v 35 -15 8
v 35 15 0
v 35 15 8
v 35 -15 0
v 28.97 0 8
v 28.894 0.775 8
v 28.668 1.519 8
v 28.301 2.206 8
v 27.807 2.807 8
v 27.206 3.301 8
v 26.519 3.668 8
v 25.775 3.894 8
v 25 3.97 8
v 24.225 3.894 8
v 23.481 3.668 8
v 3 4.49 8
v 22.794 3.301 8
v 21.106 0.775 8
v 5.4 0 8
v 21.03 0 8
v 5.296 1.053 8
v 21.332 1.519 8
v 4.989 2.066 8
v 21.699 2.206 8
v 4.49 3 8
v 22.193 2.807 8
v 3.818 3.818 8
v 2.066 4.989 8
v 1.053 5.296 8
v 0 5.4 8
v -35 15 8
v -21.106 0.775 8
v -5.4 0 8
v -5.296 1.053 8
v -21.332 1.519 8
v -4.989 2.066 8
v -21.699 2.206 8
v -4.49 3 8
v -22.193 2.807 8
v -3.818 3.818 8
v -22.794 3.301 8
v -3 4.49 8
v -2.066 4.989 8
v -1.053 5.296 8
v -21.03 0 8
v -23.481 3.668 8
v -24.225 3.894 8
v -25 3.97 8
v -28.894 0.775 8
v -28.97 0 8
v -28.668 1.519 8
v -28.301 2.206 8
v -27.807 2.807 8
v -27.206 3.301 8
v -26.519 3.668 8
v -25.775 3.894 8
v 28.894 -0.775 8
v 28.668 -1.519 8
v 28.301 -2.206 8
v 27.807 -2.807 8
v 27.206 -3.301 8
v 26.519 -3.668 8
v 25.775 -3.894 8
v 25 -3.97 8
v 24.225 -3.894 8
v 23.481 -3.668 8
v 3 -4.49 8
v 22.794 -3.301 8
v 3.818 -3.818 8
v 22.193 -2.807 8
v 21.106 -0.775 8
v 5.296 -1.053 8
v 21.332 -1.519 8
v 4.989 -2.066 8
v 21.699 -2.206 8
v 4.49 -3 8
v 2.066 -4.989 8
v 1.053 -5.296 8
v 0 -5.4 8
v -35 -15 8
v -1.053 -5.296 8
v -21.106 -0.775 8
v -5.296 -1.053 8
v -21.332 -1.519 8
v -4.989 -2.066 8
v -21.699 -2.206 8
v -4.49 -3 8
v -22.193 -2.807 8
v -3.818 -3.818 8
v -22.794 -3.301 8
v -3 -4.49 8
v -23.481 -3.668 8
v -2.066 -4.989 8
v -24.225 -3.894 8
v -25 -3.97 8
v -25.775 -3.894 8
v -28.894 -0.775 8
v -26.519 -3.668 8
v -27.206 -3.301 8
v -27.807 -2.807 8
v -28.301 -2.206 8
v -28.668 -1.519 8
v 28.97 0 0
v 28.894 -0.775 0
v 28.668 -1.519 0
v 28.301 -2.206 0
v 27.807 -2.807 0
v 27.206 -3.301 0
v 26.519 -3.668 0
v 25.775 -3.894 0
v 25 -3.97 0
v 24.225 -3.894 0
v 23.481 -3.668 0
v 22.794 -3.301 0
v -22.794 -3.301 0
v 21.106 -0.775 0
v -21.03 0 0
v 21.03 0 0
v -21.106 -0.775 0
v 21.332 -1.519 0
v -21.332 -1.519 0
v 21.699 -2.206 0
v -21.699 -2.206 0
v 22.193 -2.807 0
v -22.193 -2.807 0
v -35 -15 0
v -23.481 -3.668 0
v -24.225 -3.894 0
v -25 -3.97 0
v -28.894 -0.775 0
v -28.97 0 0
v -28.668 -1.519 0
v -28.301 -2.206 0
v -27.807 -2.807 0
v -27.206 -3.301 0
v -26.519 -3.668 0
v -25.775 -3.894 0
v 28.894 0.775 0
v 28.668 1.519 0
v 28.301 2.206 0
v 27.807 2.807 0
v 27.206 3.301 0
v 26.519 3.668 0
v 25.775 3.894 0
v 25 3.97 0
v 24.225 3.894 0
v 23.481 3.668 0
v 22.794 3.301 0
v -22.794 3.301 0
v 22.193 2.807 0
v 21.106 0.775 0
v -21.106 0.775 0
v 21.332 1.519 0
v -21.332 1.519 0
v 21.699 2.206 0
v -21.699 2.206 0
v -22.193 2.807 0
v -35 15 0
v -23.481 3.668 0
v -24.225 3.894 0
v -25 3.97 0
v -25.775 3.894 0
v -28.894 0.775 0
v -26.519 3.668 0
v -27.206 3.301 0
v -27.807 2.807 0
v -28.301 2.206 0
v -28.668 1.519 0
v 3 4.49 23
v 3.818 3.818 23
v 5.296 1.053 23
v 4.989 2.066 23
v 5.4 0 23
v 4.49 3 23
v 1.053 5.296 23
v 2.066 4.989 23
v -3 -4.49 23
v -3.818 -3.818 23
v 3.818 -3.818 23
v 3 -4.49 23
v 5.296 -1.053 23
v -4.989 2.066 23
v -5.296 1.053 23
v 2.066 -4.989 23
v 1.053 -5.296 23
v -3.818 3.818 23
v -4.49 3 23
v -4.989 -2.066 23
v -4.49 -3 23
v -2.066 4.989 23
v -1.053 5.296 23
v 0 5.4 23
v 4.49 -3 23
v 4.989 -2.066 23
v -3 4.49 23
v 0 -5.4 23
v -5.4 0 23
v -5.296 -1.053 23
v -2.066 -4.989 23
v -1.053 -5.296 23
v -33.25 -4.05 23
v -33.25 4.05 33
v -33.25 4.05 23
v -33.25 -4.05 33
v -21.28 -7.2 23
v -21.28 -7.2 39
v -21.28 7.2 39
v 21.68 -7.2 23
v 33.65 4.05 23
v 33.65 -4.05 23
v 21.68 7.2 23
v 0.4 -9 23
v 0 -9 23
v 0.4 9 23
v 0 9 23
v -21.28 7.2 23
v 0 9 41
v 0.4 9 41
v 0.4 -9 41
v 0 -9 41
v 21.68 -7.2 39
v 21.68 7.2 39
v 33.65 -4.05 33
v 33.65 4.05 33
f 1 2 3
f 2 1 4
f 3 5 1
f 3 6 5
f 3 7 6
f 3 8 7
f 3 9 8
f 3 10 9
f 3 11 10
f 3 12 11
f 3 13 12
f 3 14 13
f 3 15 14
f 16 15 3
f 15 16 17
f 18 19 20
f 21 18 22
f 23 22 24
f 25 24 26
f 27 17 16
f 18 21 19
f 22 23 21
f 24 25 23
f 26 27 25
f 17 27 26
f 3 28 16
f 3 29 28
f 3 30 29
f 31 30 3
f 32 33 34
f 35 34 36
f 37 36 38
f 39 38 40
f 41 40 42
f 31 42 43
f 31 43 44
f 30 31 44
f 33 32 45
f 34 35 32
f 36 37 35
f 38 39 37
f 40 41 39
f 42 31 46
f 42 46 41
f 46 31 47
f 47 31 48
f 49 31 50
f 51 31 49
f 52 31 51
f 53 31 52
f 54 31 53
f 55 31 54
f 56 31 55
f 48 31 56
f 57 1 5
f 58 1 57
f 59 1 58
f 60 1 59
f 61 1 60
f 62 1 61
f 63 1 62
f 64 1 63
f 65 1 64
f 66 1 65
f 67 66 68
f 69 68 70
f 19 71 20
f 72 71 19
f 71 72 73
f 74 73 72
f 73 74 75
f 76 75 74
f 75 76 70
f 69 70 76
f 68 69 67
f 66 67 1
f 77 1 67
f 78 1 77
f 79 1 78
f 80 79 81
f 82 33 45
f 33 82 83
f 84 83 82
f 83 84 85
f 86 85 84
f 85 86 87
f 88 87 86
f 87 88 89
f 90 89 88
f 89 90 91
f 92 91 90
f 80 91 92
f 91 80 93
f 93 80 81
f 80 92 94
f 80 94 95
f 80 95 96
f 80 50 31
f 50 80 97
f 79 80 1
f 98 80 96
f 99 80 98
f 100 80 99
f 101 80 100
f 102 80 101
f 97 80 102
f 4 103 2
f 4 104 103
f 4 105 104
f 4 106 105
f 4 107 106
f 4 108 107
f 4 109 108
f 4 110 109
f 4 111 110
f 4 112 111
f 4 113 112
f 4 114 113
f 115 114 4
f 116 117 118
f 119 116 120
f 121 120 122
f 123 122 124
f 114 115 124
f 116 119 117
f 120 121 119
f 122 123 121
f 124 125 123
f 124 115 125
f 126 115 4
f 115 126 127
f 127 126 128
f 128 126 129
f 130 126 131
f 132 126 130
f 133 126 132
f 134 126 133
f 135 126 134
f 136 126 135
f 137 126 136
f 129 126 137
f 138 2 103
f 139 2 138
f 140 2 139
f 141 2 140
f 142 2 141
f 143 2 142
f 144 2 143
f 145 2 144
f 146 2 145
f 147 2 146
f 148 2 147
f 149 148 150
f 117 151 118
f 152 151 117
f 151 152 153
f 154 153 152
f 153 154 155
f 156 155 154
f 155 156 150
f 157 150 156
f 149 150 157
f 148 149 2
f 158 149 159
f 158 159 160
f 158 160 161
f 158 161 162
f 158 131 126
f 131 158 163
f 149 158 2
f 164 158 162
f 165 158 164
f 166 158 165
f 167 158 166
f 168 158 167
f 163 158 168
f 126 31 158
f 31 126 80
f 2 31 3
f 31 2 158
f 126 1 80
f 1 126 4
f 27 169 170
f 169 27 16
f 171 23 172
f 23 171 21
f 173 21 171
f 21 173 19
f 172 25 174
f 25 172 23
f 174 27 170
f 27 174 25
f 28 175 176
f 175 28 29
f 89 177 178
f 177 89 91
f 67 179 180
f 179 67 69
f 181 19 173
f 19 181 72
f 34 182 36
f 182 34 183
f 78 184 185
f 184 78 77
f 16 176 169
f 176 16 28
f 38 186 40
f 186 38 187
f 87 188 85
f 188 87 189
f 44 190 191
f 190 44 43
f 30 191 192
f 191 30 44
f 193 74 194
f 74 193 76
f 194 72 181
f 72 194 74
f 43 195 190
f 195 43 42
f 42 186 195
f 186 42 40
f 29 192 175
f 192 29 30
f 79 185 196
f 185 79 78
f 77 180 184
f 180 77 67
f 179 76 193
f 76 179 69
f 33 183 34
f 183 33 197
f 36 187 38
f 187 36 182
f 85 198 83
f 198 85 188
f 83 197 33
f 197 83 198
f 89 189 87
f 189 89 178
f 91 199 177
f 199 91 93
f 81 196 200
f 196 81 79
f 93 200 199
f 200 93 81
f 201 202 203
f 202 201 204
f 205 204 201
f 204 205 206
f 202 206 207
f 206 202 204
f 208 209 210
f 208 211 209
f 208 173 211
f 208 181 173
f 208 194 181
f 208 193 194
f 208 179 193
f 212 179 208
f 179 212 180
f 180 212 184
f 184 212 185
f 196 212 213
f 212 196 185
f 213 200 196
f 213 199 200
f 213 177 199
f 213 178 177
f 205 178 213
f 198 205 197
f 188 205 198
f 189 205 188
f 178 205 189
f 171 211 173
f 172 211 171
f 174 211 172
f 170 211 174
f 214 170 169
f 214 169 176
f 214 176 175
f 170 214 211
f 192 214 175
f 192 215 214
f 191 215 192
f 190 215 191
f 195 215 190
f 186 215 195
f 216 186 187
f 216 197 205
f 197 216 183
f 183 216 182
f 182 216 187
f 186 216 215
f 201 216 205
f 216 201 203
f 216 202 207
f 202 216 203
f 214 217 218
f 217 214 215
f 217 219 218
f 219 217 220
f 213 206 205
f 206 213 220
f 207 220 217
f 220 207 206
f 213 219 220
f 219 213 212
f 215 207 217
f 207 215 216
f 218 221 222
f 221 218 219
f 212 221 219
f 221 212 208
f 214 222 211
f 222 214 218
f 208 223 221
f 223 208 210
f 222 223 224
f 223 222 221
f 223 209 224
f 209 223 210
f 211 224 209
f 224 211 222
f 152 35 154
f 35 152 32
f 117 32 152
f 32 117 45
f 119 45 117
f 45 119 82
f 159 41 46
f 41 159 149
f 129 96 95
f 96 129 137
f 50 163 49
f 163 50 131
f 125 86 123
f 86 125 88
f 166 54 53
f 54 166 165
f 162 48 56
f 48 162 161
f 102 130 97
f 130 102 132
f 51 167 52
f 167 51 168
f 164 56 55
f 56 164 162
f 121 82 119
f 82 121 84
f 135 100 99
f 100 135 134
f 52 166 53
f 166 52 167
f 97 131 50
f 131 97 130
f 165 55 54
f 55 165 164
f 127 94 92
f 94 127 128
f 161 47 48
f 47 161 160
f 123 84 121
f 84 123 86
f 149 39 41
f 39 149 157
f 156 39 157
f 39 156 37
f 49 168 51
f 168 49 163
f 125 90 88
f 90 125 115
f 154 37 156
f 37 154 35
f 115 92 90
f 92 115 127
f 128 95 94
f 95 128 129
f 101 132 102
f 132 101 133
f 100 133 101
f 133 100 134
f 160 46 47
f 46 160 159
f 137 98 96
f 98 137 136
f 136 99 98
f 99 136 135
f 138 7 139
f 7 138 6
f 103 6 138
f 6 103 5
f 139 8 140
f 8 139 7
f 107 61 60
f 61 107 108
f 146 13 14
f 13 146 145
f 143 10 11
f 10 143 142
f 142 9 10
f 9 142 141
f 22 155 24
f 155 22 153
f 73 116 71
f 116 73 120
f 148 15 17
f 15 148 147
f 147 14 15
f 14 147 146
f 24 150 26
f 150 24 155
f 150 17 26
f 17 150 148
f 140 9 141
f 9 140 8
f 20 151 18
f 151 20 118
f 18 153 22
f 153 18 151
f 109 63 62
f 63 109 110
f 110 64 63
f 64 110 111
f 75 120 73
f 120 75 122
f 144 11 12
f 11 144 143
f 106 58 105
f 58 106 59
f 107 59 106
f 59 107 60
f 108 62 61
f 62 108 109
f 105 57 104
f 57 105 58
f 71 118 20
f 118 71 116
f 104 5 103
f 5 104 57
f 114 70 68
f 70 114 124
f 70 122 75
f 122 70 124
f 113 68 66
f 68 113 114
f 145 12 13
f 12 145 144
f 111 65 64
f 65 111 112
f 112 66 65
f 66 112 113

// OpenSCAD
$fn = 32;

// ----------------------------------------------------------------------
// Boat cleat: 70 mm base, horn 32 mm up
// ----------------------------------------------------------------------

// --- parameters (mm) ---
base_l = 70;              // base length
base_w = 30;              // base width
base_t = 8;               // base thickness
horn_len = 66.5;          // horn length
horn_d = 18;              // horn diameter at the middle
horn_z = 32;              // horn axis height
end_drop = 8;             // how far the horn tips drop
post_d = 10.8;            // centre post diameter
holes_d = 7.94;           // fixing holes
hole_x = 25;              // fixing hole spacing

difference() {
  union() {
    translate([-35, -15, 0]) cube([base_l, base_w, base_t]);
    /* centre post, sunk 1 mm into the base */
    translate([0, 0, 7]) cylinder(h = 25, d = post_d);
    /* horn: a hull chain of boxes, full in the middle and lighter at the tips */
    hull() {
      translate([-33.25, -4.05, 23]) cube([0.4, 8.1, 10], center = false);
      translate([-21.28, -7.2, 23]) cube([0.4, 14.4, 16], center = false);
    }
    hull() {
      translate([-21.28, -7.2, 23]) cube([0.4, 14.4, 16], center = false);
      translate([0, -9, 23]) cube([0.4, 18, 18], center = false);
    }
    hull() {
      translate([0, -9, 23]) cube([0.4, 18, 18], center = false);
      translate([21.28, -7.2, 23]) cube([0.4, 14.4, 16], center = false);
    }
    hull() {
      translate([21.28, -7.2, 23]) cube([0.4, 14.4, 16], center = false);
      translate([33.25, -4.05, 23]) cube([0.4, 8.1, 10], center = false);
    }
  }
  translate([-25, 0, -2.5]) cylinder(h = base_t + 5, d = holes_d);
  translate([25, 0, -2.5]) cylinder(h = base_t + 5, d = holes_d);
}
